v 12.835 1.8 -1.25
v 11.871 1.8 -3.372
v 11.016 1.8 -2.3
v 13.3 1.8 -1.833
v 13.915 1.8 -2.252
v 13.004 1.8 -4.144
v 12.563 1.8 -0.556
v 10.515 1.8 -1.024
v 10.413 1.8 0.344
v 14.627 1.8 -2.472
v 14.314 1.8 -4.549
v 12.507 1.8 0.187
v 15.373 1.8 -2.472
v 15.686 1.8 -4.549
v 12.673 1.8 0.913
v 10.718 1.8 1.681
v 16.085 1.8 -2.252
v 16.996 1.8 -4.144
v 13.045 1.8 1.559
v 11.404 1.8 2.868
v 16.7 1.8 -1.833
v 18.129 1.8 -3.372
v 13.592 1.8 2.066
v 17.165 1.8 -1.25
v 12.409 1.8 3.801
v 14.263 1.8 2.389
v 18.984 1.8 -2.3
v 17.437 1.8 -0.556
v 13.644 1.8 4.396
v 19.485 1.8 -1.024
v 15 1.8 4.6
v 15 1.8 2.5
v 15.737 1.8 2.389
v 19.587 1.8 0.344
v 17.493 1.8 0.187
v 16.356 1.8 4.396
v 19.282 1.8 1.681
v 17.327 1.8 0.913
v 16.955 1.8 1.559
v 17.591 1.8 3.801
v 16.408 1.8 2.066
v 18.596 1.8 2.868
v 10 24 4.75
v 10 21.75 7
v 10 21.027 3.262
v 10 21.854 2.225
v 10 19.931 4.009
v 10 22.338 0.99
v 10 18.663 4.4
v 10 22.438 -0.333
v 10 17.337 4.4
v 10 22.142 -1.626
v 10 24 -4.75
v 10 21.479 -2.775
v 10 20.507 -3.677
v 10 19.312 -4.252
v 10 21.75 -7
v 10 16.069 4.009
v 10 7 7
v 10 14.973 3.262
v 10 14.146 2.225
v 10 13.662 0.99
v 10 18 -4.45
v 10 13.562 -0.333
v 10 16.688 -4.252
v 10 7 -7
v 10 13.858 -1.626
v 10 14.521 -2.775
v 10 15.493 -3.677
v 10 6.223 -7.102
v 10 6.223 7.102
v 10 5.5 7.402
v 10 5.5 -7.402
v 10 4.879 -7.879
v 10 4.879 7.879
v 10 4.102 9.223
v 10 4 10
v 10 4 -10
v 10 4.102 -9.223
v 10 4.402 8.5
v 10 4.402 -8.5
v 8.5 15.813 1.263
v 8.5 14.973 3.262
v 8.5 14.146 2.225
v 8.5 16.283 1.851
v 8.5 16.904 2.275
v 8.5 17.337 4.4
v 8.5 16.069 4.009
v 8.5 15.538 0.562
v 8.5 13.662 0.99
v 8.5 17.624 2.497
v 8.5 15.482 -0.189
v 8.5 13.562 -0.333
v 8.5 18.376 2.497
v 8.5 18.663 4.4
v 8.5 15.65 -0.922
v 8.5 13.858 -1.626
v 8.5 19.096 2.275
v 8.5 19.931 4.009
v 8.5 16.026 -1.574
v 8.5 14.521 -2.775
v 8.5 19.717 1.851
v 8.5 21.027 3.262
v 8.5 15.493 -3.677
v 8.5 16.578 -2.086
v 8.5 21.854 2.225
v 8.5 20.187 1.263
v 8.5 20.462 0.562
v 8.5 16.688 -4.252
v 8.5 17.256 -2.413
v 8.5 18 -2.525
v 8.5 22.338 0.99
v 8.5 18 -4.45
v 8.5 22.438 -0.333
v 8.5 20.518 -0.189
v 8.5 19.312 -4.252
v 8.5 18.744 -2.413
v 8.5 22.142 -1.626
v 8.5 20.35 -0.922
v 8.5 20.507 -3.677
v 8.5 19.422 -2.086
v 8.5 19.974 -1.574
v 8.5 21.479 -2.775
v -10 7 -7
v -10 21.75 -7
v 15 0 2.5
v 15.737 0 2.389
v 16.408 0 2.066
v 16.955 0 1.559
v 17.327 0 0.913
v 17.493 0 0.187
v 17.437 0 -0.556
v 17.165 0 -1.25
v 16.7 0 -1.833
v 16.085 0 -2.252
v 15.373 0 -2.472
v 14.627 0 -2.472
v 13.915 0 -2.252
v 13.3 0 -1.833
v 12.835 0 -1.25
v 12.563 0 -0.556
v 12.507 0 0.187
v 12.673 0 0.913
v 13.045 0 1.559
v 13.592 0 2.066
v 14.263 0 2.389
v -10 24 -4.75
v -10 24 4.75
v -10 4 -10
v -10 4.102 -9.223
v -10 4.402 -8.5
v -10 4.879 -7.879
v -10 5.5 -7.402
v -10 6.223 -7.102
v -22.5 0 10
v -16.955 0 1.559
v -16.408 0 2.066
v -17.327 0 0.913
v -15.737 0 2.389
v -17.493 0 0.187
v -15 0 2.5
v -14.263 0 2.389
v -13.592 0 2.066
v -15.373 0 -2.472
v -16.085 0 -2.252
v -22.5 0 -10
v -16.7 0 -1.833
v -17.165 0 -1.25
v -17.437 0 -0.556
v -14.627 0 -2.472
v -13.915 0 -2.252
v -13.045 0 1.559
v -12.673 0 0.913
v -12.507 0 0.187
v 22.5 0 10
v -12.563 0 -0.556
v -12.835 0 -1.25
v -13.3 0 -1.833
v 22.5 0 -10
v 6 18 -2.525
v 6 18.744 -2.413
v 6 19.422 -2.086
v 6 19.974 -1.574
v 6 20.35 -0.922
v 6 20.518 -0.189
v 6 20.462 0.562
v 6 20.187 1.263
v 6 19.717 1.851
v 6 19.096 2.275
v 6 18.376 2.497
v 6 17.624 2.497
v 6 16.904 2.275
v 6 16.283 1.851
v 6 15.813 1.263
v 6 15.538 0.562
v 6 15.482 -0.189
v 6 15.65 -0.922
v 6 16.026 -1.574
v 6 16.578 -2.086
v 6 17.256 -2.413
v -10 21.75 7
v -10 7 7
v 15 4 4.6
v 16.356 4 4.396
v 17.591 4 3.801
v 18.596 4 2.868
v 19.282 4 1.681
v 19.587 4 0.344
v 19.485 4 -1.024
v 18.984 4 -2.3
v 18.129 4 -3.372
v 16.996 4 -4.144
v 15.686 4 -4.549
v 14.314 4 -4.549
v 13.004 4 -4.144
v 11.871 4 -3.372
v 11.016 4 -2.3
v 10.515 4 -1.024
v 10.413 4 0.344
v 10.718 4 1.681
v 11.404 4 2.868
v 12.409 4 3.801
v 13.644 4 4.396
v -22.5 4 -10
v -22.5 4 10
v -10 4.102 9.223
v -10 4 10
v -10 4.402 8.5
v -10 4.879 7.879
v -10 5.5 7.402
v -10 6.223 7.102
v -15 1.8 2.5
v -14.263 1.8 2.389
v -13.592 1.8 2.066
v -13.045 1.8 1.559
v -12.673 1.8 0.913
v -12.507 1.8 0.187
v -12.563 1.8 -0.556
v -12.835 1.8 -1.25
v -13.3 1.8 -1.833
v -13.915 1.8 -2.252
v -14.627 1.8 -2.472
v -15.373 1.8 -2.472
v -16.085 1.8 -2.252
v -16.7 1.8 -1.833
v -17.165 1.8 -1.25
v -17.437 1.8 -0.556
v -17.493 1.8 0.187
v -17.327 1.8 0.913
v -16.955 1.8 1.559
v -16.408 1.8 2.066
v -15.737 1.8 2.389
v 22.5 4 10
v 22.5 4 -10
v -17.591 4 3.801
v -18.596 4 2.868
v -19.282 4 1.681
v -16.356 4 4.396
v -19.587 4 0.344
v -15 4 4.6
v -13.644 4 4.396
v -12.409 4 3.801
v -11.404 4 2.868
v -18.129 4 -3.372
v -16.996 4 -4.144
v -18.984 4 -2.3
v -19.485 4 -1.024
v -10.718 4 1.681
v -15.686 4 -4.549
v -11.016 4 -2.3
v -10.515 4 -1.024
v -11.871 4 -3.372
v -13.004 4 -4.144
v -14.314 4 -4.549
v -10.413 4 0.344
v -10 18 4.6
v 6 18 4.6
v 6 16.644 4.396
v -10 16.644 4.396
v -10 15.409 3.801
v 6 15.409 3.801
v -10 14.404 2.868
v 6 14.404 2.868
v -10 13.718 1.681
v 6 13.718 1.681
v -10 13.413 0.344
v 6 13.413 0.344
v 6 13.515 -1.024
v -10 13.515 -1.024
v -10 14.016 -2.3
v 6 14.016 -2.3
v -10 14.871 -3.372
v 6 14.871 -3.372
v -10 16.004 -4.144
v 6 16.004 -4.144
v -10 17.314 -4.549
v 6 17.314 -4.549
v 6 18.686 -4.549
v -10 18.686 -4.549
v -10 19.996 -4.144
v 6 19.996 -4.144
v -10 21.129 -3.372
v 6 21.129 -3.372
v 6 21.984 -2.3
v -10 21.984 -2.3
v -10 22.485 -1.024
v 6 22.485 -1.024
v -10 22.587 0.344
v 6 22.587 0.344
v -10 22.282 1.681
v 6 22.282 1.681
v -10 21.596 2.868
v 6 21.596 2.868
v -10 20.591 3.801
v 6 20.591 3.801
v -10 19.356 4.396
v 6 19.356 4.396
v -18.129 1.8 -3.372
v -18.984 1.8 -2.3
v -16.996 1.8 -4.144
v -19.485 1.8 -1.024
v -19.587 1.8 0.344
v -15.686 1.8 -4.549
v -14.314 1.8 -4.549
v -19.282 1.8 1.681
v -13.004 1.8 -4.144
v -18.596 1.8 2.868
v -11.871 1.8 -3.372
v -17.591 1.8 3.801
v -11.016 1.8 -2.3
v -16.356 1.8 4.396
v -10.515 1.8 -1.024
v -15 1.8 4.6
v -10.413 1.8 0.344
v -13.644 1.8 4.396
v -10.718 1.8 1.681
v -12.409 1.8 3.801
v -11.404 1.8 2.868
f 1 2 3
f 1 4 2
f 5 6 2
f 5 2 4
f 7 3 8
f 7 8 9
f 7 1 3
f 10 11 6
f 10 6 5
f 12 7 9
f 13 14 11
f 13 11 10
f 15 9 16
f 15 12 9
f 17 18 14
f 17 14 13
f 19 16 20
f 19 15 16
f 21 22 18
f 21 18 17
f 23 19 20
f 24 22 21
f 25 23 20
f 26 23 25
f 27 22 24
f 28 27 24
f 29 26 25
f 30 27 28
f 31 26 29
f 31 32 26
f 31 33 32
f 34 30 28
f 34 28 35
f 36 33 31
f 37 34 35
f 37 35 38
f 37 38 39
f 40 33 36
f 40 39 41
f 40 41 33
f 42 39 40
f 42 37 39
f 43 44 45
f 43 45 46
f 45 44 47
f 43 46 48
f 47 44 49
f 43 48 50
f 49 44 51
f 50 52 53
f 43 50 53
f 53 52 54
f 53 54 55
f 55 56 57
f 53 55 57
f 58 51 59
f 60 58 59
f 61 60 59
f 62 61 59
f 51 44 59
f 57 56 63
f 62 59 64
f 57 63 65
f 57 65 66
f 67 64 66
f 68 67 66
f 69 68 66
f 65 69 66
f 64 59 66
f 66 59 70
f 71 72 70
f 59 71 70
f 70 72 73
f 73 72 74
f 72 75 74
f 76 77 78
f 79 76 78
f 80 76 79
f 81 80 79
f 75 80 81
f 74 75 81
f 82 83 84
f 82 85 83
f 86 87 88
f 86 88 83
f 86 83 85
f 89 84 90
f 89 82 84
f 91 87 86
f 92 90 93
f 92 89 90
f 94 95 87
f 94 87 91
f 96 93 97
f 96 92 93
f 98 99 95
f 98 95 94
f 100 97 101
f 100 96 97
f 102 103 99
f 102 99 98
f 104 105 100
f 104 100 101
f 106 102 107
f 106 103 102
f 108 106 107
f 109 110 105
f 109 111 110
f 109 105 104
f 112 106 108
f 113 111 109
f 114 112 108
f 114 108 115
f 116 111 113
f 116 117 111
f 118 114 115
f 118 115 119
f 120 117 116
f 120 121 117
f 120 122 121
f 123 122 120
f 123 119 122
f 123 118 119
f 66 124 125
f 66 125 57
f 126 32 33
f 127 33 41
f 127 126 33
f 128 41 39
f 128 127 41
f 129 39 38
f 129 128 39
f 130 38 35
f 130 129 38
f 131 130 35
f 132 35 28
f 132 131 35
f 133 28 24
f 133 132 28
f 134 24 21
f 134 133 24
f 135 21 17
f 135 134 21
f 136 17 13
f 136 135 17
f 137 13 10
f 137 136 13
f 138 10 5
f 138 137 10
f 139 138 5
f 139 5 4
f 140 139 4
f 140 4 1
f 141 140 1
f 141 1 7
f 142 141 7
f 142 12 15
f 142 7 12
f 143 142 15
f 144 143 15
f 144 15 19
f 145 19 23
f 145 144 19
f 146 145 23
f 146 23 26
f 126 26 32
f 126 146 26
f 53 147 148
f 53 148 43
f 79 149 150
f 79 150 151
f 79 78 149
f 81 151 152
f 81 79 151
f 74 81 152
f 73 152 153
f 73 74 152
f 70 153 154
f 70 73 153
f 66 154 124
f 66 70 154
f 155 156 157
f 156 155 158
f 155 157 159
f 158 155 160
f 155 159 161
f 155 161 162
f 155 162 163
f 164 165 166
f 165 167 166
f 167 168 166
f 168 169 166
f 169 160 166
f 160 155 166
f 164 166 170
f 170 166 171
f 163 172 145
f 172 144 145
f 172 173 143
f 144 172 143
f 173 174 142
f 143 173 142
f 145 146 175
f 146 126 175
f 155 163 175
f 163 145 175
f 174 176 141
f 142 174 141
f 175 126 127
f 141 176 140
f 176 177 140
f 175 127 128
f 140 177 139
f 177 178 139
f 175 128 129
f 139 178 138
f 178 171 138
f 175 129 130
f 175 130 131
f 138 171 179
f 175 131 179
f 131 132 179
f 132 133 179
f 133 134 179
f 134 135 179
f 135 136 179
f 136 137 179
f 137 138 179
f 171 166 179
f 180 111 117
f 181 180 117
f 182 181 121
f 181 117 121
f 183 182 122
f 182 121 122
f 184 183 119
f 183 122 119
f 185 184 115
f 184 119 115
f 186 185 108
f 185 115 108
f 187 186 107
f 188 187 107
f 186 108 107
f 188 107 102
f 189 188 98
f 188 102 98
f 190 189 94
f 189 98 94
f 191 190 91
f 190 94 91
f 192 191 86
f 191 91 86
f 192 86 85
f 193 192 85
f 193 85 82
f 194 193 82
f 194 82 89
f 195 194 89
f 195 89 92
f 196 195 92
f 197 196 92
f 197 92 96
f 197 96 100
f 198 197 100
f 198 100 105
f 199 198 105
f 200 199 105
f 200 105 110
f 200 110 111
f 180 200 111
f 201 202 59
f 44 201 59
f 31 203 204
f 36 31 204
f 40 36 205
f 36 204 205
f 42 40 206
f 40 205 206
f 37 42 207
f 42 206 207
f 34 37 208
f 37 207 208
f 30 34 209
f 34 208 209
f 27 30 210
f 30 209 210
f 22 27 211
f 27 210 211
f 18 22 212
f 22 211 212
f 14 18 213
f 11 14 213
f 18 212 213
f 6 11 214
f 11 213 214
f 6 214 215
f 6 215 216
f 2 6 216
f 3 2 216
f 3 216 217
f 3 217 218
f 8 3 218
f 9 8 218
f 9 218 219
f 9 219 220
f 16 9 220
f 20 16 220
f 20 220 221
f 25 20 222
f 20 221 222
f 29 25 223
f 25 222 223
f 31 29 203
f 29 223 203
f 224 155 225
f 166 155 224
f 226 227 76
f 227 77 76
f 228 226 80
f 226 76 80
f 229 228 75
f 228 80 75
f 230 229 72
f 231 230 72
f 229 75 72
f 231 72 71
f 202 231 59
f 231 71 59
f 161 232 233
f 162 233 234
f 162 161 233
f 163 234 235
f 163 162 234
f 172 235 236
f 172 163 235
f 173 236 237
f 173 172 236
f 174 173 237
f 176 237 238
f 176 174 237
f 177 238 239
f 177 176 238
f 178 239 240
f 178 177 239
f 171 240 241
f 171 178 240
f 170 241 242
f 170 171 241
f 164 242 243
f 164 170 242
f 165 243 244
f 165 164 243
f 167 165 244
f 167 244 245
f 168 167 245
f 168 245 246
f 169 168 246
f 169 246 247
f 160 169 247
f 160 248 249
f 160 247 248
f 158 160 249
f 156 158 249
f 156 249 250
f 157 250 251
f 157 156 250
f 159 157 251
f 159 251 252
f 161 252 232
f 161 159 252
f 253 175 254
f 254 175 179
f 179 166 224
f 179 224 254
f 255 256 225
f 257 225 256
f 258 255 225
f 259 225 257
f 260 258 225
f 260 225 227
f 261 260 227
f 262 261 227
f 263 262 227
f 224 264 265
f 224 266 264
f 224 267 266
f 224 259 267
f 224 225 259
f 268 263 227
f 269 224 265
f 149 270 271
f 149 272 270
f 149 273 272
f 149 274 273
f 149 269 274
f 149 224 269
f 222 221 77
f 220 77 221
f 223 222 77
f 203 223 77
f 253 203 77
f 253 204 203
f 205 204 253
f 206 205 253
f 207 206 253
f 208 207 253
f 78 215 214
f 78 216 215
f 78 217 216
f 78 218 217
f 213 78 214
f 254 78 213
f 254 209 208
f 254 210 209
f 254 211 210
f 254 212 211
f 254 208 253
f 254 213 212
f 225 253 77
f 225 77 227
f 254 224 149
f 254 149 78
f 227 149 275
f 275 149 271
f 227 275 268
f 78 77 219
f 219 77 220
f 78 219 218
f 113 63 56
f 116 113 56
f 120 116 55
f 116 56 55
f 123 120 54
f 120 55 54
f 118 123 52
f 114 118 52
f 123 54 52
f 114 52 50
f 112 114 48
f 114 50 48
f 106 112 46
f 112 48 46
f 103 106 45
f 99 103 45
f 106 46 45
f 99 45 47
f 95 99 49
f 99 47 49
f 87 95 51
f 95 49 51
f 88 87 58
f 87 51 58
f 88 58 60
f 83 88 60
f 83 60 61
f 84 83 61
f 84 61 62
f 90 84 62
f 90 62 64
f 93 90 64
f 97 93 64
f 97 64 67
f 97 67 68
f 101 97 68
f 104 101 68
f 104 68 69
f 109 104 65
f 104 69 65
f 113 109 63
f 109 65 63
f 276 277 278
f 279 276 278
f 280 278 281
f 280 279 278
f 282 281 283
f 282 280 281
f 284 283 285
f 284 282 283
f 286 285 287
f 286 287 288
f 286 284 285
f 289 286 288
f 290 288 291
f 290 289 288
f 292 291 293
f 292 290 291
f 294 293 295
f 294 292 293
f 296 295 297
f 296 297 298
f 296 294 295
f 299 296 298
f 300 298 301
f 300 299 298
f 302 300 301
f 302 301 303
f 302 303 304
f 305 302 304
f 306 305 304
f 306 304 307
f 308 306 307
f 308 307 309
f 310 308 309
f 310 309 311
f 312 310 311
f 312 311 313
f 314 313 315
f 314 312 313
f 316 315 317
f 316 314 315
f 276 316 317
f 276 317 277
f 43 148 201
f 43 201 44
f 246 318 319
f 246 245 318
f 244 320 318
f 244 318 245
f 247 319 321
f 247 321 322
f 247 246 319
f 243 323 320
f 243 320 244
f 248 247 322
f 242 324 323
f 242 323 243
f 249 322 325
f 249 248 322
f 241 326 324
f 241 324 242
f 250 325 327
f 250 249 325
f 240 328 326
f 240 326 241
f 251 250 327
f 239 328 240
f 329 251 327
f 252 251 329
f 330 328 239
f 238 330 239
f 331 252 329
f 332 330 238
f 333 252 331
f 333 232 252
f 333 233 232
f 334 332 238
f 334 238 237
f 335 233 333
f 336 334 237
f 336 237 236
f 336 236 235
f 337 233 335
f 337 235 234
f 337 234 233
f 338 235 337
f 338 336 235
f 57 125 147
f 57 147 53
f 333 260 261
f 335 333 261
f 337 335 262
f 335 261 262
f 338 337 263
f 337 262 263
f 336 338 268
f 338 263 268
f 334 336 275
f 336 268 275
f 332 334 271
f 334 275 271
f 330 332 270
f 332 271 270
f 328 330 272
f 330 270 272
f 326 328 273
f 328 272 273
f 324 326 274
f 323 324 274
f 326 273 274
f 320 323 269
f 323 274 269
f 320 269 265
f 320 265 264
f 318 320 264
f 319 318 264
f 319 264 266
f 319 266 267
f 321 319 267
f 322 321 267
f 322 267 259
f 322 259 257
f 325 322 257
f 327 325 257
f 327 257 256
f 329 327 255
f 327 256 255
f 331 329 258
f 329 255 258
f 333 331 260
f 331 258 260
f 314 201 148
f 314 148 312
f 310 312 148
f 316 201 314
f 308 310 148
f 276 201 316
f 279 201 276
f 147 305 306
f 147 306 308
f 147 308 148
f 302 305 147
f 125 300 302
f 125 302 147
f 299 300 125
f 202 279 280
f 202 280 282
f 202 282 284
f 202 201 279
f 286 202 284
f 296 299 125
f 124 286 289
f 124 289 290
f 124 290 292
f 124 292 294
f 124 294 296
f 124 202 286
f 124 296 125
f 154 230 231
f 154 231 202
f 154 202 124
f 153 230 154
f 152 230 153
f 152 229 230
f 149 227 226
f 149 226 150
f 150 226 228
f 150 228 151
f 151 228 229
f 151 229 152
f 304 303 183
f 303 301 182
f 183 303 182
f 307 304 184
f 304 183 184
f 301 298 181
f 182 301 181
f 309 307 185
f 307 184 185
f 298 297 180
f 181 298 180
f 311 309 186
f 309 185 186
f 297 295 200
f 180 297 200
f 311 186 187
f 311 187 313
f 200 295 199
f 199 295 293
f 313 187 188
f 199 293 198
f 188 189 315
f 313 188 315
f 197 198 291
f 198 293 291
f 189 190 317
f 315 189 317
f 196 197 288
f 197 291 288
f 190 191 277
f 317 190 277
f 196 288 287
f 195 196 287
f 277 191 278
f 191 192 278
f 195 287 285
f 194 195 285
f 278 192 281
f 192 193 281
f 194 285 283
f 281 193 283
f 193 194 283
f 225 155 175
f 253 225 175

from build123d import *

# Parameters (mm, degrees)
SKETCH1_W           = 45
SKETCH1_H           = 20
SKETCH1_R           = 4.6
SKETCH1_W_2         = 20
SKETCH1_H_2         = 14
SKETCH1_R_2         = 2.5
BOSS_EXTRUDE1_DEPTH = 4
BOSS_EXTRUDE2_START = 4
SKETCH1_4_W         = 20
SKETCH1_4_H         = 14
BOSS_EXTRUDE2_DEPTH = 20
CUT_EXTRUDE1_START  = 4
SKETCH1_5_R         = 4.6
CUT_EXTRUDE1_DEPTH  = 2.2
CUT_EXTRUDE2_START  = -20
SKETCH2_R           = 4.6
CUT_EXTRUDE2_DEPTH  = 16
SKETCH2_6_R         = 2.525
CUT_EXTRUDE3_DEPTH  = 4
SKETCH2_7_R         = 4.45
SKETCH2_7_R_2       = 2.525
CUT_EXTRUDE4_DEPTH  = 1.5
FILLET1_R           = 3
CHAMFER1_SIZE       = 2.25


with BuildPart() as part:
    # Sketch1 → Boss-Extrude1 (new body)
    # profile 1 of 4: a face of its own
    with BuildSketch(Plane(origin=(0, 0, 0), x_dir=(1, 0, 0), z_dir=(0, 1, 0))):
        Rectangle(SKETCH1_W, SKETCH1_H)
        with Locations((15, 0)):
            Circle(SKETCH1_R, mode=Mode.SUBTRACT)
        with Locations((-15, 0)):
            Circle(SKETCH1_R, mode=Mode.SUBTRACT)
        Rectangle(SKETCH1_W_2, SKETCH1_H_2, mode=Mode.SUBTRACT)
    # profile 2 of 4: a face of its own
    with BuildSketch(Plane(origin=(0, 0, 0), x_dir=(1, 0, 0), z_dir=(0, 1, 0))):
        with Locations((-15, 0)):
            Circle(SKETCH1_R)
        with Locations(Location((-15, 0, 0), (0, 0, 270))):
            Circle(SKETCH1_R_2, mode=Mode.SUBTRACT)
    # profile 3 of 4: a face of its own
    with BuildSketch(Plane(origin=(0, 0, 0), x_dir=(1, 0, 0), z_dir=(0, 1, 0))):
        with Locations((15, 0)):
            Circle(SKETCH1_R)
        with Locations(Location((15, 0, 0), (0, 0, 270))):
            Circle(SKETCH1_R_2, mode=Mode.SUBTRACT)
    # profile 4 of 4: a face of its own
    with BuildSketch(Plane(origin=(0, 0, 0), x_dir=(1, 0, 0), z_dir=(0, 1, 0))):
        Rectangle(SKETCH1_W_2, SKETCH1_H_2)
    extrude(amount=BOSS_EXTRUDE1_DEPTH)

    # Sketch1<4> → Boss-Extrude2 (add)
    with BuildSketch(Plane(origin=(0, 0, 0), x_dir=(1, 0, 0), z_dir=(0, 1, 0)).offset(BOSS_EXTRUDE2_START)):
        Rectangle(SKETCH1_4_W, SKETCH1_4_H)
    extrude(amount=BOSS_EXTRUDE2_DEPTH)

    # Sketch1<5> → Cut-Extrude1 (cut)
    with BuildSketch(Plane(origin=(0, 0, 0), x_dir=(1, 0, 0), z_dir=(0, 1, 0)).offset(CUT_EXTRUDE1_START)):
        with Locations(Location((15, 0, 0), (0, 0, 270))):
            Circle(SKETCH1_5_R)
        with Locations(Location((-15, 0, 0), (0, 0, 270))):
            Circle(SKETCH1_5_R)
    extrude(amount=-CUT_EXTRUDE1_DEPTH, mode=Mode.SUBTRACT)

    # Sketch2 → Cut-Extrude2 (cut)
    with BuildSketch(Plane(origin=(10, 0, 0), x_dir=(0, 0, -1), z_dir=(1, 0, 0)).offset(CUT_EXTRUDE2_START)):
        with Locations(Location((0, 18, 0), (0, 0, 180))):
            Circle(SKETCH2_R)
    extrude(amount=CUT_EXTRUDE2_DEPTH, mode=Mode.SUBTRACT)

    # Sketch2<6> → Cut-Extrude3 (cut)
    with BuildSketch(Plane(origin=(10, 0, 0), x_dir=(0, 0, -1), z_dir=(1, 0, 0))):
        with Locations((0, 18)):
            Circle(SKETCH2_6_R)
    extrude(amount=-CUT_EXTRUDE3_DEPTH, mode=Mode.SUBTRACT)

    # Sketch2<7> → Cut-Extrude4 (cut)
    with BuildSketch(Plane(origin=(10, 0, 0), x_dir=(0, 0, -1), z_dir=(1, 0, 0))):
        with Locations((0, 18)):
            Circle(SKETCH2_7_R)
        with Locations((0, 18)):
            Circle(SKETCH2_7_R_2, mode=Mode.SUBTRACT)
    extrude(amount=-CUT_EXTRUDE4_DEPTH, mode=Mode.SUBTRACT)

    # Fillet1
    fillet1_edges = [part.edges().sort_by_distance(p)[0] for p in [
        (0, 4, 7),
        (0, 4, -7),
    ]]
    fillet(fillet1_edges, radius=FILLET1_R - 0.0001)  # a hair under: the kernel refuses the full size

    # Chamfer1
    chamfer1_edges = [part.edges().sort_by_distance(p)[0] for p in [
        (0, 24, -7),
        (0, 24, 7),
    ]]
    chamfer(chamfer1_edges, length=CHAMFER1_SIZE)


solid = part.part
